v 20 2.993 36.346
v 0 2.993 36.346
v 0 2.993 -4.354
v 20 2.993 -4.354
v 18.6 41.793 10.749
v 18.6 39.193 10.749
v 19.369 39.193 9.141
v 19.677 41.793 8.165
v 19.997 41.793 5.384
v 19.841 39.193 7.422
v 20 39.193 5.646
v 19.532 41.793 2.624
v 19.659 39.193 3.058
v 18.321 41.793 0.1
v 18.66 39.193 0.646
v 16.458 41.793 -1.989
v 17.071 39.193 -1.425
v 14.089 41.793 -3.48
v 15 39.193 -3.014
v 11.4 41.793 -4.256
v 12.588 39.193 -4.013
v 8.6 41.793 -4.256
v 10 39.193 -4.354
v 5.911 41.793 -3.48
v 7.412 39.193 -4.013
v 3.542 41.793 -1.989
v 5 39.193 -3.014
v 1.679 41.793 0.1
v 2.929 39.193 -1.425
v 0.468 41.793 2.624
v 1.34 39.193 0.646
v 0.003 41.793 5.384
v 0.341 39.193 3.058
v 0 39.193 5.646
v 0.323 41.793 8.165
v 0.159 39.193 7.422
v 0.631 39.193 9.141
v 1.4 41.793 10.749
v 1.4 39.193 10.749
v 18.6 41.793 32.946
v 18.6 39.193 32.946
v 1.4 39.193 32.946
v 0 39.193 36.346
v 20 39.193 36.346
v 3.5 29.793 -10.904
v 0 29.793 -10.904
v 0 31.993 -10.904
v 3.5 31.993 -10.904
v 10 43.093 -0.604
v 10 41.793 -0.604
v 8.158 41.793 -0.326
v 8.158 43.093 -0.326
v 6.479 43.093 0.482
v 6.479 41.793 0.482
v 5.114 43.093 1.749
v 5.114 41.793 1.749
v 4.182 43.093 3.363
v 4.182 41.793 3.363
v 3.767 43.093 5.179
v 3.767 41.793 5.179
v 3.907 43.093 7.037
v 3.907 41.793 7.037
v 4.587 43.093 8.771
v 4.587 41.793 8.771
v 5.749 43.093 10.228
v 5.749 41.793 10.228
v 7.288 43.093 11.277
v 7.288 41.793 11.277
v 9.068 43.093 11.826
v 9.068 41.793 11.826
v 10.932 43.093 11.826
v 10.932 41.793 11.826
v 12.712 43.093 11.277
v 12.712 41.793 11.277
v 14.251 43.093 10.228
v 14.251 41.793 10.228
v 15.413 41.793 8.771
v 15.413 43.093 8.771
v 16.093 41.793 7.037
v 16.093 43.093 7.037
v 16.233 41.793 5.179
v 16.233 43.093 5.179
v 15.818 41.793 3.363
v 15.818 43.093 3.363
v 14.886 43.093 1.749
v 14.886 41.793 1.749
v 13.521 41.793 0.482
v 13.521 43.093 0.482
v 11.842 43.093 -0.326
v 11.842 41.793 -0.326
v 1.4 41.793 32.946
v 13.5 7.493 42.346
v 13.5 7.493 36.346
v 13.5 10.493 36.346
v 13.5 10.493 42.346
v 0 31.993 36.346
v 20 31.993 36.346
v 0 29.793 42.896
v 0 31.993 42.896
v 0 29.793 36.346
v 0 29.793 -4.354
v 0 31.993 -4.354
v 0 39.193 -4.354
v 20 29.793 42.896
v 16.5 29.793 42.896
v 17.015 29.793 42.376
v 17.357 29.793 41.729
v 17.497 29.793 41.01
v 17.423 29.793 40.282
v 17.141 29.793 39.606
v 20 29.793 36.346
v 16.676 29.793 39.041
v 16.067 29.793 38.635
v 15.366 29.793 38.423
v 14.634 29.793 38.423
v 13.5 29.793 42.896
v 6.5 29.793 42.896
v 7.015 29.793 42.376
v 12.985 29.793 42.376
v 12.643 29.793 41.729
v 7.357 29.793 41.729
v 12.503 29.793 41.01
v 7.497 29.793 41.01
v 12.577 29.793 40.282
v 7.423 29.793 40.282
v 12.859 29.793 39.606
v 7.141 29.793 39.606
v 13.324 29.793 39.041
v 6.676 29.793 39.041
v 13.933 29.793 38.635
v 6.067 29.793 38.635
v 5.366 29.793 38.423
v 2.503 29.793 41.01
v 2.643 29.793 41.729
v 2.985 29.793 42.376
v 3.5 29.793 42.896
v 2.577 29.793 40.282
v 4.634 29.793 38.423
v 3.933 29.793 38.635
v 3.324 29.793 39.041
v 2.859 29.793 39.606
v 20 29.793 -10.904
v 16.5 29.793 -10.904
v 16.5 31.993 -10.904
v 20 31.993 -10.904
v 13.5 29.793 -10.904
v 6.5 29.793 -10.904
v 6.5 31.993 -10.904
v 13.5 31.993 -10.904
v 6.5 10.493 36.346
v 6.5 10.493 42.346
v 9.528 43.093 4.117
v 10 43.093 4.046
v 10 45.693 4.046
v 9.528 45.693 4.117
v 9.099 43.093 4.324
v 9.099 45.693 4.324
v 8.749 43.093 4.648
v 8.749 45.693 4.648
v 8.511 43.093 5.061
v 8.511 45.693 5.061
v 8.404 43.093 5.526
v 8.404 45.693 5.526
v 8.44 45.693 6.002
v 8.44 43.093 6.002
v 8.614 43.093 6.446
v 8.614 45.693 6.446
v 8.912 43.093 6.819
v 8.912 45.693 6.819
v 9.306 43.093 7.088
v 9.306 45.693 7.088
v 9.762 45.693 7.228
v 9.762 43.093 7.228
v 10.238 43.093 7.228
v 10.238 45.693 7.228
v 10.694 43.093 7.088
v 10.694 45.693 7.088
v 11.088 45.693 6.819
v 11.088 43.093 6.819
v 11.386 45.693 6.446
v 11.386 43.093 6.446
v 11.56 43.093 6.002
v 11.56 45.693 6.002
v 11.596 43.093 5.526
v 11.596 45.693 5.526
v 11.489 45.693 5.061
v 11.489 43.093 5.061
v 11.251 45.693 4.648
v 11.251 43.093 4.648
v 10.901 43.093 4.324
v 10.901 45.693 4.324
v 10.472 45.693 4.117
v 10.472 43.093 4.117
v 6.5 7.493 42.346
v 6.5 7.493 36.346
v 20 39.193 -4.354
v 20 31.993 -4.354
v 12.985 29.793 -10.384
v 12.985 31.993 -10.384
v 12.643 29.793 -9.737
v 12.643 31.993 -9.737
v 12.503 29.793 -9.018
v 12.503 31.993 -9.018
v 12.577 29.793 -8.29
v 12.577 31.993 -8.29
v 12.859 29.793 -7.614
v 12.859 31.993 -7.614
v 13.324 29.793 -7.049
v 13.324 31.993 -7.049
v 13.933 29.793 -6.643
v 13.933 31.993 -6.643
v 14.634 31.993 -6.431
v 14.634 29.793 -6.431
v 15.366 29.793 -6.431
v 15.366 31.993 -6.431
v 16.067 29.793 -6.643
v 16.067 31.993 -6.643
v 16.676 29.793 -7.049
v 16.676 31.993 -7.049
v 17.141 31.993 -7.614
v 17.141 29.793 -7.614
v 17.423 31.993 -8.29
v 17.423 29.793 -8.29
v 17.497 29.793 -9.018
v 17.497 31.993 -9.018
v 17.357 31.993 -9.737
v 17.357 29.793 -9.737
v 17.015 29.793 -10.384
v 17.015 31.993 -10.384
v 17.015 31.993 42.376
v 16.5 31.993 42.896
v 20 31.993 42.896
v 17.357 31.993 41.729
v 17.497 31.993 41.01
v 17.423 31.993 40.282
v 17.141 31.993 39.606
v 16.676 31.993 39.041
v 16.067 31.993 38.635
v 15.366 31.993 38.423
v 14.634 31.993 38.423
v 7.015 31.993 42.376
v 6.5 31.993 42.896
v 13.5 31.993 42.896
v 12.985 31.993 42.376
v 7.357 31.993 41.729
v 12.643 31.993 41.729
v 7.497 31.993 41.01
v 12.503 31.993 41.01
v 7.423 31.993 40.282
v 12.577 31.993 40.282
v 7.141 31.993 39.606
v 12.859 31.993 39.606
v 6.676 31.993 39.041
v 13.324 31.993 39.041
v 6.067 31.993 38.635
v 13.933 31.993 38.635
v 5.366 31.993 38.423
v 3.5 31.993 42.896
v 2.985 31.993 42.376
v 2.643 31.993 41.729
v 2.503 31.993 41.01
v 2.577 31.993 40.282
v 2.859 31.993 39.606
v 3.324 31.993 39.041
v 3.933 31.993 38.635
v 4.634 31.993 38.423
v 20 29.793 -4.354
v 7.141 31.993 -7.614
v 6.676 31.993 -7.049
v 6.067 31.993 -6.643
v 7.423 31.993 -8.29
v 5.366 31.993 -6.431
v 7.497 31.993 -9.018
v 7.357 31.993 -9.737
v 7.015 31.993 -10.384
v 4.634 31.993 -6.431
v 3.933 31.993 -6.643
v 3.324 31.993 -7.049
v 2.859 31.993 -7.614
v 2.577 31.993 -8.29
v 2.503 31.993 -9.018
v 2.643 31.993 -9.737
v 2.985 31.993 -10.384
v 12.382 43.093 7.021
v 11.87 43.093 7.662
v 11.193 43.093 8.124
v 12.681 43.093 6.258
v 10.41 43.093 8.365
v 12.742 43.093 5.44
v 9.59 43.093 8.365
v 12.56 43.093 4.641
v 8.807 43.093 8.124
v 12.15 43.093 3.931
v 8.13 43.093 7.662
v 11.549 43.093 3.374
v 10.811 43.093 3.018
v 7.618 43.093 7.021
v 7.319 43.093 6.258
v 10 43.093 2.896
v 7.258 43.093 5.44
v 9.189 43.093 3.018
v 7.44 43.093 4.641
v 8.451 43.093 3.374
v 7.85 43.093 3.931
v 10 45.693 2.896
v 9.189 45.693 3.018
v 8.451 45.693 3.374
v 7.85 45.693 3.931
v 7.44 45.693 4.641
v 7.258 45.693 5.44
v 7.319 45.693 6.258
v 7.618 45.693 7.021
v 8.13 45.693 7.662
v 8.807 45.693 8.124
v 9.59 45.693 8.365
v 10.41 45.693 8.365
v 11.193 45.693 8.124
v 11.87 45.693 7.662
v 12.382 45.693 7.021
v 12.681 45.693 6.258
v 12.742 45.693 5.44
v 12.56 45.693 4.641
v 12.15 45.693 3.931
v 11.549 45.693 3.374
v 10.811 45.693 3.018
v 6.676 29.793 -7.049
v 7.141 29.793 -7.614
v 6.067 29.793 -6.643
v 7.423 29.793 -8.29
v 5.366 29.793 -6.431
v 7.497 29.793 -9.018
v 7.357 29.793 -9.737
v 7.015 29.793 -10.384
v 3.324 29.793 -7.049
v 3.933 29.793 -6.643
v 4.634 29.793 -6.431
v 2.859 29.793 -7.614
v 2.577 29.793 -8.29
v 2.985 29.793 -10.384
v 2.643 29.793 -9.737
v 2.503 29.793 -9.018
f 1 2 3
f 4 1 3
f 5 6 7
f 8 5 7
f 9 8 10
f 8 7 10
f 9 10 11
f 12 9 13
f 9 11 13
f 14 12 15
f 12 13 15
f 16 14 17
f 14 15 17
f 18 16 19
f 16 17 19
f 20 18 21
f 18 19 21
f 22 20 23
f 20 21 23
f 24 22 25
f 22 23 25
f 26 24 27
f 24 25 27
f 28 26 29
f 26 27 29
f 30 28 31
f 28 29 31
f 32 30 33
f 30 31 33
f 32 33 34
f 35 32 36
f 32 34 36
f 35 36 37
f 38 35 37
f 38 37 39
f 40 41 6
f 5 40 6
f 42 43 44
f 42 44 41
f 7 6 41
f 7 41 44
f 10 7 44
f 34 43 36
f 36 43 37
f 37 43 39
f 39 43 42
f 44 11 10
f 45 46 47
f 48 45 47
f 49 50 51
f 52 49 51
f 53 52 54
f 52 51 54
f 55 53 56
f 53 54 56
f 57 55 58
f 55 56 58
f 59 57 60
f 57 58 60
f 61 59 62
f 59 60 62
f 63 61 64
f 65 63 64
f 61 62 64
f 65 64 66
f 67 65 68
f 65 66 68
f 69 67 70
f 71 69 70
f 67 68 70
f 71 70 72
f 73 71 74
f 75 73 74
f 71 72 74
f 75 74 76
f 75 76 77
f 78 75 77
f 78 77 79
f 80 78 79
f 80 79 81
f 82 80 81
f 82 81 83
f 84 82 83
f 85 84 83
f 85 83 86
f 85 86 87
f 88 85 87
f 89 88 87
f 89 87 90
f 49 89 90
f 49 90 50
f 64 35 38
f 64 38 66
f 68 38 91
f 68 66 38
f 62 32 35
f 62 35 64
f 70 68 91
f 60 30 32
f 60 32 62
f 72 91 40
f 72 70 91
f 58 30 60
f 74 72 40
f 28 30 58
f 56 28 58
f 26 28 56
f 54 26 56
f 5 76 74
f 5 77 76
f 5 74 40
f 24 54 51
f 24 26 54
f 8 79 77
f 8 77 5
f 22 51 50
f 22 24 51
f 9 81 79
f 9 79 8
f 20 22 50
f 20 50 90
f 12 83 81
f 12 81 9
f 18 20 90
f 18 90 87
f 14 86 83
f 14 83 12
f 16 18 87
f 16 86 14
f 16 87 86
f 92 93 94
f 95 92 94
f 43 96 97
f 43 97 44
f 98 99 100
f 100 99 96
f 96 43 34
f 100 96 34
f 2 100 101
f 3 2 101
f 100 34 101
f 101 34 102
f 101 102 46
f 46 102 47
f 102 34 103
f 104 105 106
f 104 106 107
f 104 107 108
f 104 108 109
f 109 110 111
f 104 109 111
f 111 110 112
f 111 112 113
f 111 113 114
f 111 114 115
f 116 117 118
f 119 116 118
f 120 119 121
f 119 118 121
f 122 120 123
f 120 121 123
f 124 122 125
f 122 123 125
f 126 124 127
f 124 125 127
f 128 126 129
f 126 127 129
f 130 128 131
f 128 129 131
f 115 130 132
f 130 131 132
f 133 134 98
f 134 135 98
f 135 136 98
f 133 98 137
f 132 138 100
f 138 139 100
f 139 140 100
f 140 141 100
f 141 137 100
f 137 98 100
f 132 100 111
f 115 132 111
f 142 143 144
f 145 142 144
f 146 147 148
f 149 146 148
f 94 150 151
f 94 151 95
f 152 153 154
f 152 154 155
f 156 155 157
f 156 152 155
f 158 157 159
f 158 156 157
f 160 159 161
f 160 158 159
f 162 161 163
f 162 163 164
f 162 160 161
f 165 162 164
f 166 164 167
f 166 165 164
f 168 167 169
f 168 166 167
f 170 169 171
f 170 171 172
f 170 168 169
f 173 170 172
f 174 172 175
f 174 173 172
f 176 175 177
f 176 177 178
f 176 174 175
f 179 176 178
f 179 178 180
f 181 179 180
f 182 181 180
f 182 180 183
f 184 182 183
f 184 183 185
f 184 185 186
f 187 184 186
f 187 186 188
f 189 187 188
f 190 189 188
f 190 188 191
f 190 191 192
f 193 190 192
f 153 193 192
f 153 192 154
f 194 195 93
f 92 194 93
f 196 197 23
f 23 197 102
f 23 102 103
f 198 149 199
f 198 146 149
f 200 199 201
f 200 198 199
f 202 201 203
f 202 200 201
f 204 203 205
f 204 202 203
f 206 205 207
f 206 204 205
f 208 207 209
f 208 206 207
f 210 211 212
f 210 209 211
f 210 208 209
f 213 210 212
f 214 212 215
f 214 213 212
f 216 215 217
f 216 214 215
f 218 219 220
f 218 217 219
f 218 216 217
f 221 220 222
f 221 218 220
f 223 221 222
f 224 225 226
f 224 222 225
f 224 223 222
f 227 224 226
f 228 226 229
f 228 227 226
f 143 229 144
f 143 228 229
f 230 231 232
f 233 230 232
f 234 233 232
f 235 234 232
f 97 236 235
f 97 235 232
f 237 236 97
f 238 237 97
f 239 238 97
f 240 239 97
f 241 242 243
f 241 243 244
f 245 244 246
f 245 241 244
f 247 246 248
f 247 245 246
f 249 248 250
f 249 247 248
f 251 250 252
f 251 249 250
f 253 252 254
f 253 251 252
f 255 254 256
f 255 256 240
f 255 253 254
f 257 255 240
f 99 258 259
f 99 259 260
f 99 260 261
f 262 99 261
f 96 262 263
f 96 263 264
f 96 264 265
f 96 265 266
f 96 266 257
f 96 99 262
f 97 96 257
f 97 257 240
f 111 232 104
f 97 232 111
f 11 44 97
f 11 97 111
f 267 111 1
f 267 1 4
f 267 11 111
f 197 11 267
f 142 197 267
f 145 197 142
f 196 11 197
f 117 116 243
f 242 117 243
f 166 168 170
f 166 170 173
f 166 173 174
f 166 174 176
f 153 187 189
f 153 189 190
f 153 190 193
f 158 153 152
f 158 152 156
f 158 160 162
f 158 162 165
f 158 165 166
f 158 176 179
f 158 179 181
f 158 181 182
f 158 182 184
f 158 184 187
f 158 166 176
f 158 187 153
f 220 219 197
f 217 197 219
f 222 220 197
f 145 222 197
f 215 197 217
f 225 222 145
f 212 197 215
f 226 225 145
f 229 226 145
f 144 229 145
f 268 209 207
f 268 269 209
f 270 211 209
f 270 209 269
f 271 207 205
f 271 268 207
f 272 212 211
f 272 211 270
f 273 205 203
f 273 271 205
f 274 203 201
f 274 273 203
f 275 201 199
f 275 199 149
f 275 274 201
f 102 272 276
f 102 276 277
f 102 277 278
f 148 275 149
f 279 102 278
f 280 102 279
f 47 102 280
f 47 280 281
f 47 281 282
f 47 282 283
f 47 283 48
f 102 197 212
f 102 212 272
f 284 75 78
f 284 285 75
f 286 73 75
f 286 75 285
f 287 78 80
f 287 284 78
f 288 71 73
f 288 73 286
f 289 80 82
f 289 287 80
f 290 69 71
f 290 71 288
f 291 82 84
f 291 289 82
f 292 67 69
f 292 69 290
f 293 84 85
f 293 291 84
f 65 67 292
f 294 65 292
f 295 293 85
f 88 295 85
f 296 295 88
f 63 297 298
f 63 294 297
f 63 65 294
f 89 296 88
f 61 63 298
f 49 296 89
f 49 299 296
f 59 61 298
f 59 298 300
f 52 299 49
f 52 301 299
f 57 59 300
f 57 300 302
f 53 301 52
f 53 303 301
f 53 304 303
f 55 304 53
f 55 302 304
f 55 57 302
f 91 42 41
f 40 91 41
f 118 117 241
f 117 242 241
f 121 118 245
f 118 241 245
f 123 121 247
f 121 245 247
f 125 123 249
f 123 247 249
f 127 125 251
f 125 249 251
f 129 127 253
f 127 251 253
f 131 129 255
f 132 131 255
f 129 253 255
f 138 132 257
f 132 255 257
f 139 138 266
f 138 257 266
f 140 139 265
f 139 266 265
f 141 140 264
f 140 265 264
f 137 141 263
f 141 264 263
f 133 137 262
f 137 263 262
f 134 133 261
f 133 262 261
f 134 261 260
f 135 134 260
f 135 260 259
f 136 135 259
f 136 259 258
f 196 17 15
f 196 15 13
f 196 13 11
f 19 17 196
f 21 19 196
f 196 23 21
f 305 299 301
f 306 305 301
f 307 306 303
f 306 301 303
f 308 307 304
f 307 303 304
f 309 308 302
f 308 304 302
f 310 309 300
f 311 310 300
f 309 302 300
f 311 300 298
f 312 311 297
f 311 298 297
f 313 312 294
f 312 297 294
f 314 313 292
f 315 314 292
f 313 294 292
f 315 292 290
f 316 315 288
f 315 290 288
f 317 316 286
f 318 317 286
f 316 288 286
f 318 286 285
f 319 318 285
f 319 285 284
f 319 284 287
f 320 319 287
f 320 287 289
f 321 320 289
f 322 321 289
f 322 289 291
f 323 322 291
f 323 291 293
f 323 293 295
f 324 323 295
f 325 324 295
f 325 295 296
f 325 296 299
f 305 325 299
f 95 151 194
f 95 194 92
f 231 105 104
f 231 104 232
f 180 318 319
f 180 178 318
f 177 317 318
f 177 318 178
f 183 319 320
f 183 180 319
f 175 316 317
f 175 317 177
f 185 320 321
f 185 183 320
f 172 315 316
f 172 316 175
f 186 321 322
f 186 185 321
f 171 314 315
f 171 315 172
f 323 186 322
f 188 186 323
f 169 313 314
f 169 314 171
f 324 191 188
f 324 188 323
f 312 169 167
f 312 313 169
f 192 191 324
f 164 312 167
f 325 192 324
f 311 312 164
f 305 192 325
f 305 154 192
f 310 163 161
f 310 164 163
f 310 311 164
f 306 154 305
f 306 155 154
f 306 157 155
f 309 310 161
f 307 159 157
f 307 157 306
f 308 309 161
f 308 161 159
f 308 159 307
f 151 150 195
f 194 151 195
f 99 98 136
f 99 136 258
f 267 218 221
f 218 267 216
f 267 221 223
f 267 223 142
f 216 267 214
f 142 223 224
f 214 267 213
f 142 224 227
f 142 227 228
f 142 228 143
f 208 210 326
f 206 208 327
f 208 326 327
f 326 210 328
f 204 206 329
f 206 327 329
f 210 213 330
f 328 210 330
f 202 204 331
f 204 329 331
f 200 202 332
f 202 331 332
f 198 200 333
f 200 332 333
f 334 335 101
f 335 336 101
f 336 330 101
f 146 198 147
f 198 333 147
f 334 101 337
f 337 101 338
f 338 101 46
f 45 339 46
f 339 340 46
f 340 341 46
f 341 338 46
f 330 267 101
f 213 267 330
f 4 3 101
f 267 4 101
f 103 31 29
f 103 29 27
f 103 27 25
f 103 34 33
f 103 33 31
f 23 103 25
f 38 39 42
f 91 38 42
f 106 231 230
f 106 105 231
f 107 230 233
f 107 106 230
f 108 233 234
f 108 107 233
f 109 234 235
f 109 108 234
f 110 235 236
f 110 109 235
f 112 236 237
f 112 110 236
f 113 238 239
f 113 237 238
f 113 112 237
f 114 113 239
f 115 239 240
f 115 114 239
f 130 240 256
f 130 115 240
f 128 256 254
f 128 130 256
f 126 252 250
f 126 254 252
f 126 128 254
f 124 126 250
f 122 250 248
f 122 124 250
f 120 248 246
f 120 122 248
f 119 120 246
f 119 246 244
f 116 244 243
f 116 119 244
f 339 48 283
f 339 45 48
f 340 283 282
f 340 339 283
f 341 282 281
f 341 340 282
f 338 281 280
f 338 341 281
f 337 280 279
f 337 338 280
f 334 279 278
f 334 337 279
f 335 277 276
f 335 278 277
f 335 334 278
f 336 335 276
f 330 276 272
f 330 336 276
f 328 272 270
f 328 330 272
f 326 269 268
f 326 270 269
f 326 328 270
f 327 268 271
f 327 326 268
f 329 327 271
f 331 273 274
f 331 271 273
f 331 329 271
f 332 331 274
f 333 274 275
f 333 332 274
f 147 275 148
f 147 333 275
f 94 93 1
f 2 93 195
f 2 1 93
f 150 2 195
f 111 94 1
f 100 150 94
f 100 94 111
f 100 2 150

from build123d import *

# Parameters (mm, degrees)
SKETCH1_W           = 40.7
SKETCH1_H           = 36.2
BOSS_EXTRUDE1_DEPTH = 20
SKETCH2_W           = 6.55
SKETCH2_H           = 2.2
BOSS_EXTRUDE2_DEPTH = 20
SKETCH3_R           = 6.25
BOSS_EXTRUDE3_DEPTH = 38.8
SKETCH3_3_R         = 6.25
SKETCH3_3_R_2       = 2.75
SKETCH3_3_R_3       = 1.6
BOSS_EXTRUDE4_DEPTH = 40.1
SKETCH3_4_R         = 2.75
SKETCH3_4_R_2       = 1.6
BOSS_EXTRUDE5_DEPTH = 42.7
SKETCH5_R           = 2.5
CUT_EXTRUDE1_DEPTH  = 43.9
SKETCH8_R           = 2.5
CUT_EXTRUDE2_DEPTH  = 43.9
SKETCH10_R          = 2.5
CUT_EXTRUDE3_DEPTH  = 43.9
SKETCH12_W          = 7
SKETCH12_H          = 1.5
BOSS_EXTRUDE6_DEPTH = 6


with BuildPart() as part:
    # Sketch1 → Boss-Extrude1 (new body)
    with BuildSketch(Plane(origin=(0, 0, 0), x_dir=(0, 0, -1), z_dir=(1, 0, 0))):
        with Locations((-15.995997066, 21.093377017)):
            Rectangle(SKETCH1_W, SKETCH1_H)
    extrude(amount=BOSS_EXTRUDE1_DEPTH)

    # Sketch2 → Boss-Extrude2 (add)
    with BuildSketch(Plane(origin=(0, 0, 0), x_dir=(0, 0, -1), z_dir=(1, 0, 0))):
        with Locations((-39.620997066, 30.893377017)):
            Rectangle(SKETCH2_W, SKETCH2_H)
        with Locations((7.629002934, 30.893377017)):
            Rectangle(SKETCH2_W, SKETCH2_H)
    extrude(amount=BOSS_EXTRUDE2_DEPTH)

    # Sketch3 → Boss-Extrude3 (add)
    with BuildSketch(Plane(origin=(0, 2.993377017, 0), x_dir=(1, 0, 0), z_dir=(0, 1, 0))):
        with BuildLine():
            Line((1.4, -10.748937395), (1.4, -32.945997066))
            Line((1.4, -32.945997066), (18.6, -32.945997066))
            Line((18.6, -32.945997066), (18.6, -10.748937395))
            ThreePointArc((18.6, -10.748937395), (10, 4.354002934), (1.4, -10.748937395))
        make_face()
        with Locations(Location((10, -5.645997066, 0), (0, 0, 90))):
            Circle(SKETCH3_R, mode=Mode.SUBTRACT)
    extrude(amount=BOSS_EXTRUDE3_DEPTH)

    # Sketch3<3> → Boss-Extrude4 (add)
    # profile 1 of 2: a face of its own
    with BuildSketch(Plane(origin=(0, 2.993377017, 0), x_dir=(1, 0, 0), z_dir=(0, 1, 0))):
        with Locations(Location((10, -5.645997066, 0), (0, 0, 90))):
            Circle(SKETCH3_3_R)
        with Locations(Location((10, -5.645997066, 0), (0, 0, 90))):
            Circle(SKETCH3_3_R_2, mode=Mode.SUBTRACT)
    # profile 2 of 2: a face of its own
    with BuildSketch(Plane(origin=(0, 2.993377017, 0), x_dir=(1, 0, 0), z_dir=(0, 1, 0))):
        with Locations(Location((10, -5.645997066, 0), (0, 0, 90))):
            Circle(SKETCH3_3_R_3)
    extrude(amount=BOSS_EXTRUDE4_DEPTH)

    # Sketch3<4> → Boss-Extrude5 (add)
    with BuildSketch(Plane(origin=(0, 2.993377017, 0), x_dir=(1, 0, 0), z_dir=(0, 1, 0))):
        with Locations(Location((10, -5.645997066, 0), (0, 0, 90))):
            Circle(SKETCH3_4_R)
        with Locations(Location((10, -5.645997066, 0), (0, 0, 90))):
            Circle(SKETCH3_4_R_2, mode=Mode.SUBTRACT)
    extrude(amount=BOSS_EXTRUDE5_DEPTH)

    # Sketch5 → Cut-Extrude1 (cut)
    with BuildSketch(Plane(origin=(0, 0, 0), x_dir=(1, 0, 0), z_dir=(0, 1, 0))):
        with Locations((15, -40.895997066)):
            Circle(SKETCH5_R)
    extrude(amount=CUT_EXTRUDE1_DEPTH, mode=Mode.SUBTRACT)

    # Sketch8 → Cut-Extrude2 (cut)
    with BuildSketch(Plane(origin=(0, 31.993377017, 0), x_dir=(1, 0, 0), z_dir=(0, 1, 0))):
        with Locations((5, -40.895997066)):
            Circle(SKETCH8_R)
    extrude(amount=-CUT_EXTRUDE2_DEPTH, mode=Mode.SUBTRACT)

    # Sketch10 → Cut-Extrude3 (cut)
    with BuildSketch(Plane(origin=(0, 0, 0), x_dir=(1, 0, 0), z_dir=(0, 1, 0))):
        with Locations((5, 8.904002934)):
            Circle(SKETCH10_R)
        with Locations((15, 8.904002934)):
            Circle(SKETCH10_R)
    extrude(amount=CUT_EXTRUDE3_DEPTH, mode=Mode.SUBTRACT)

    # Sketch12 → Boss-Extrude6 (add)
    with BuildSketch(Plane.XY.offset(36.345997066)):
        with Locations((10, 9.743377017)):
            Rectangle(SKETCH12_W, SKETCH12_H)
        with Locations((10, 8.243377017)):
            Rectangle(SKETCH12_W, SKETCH12_H)
    extrude(amount=BOSS_EXTRUDE6_DEPTH)


solid = part.part
